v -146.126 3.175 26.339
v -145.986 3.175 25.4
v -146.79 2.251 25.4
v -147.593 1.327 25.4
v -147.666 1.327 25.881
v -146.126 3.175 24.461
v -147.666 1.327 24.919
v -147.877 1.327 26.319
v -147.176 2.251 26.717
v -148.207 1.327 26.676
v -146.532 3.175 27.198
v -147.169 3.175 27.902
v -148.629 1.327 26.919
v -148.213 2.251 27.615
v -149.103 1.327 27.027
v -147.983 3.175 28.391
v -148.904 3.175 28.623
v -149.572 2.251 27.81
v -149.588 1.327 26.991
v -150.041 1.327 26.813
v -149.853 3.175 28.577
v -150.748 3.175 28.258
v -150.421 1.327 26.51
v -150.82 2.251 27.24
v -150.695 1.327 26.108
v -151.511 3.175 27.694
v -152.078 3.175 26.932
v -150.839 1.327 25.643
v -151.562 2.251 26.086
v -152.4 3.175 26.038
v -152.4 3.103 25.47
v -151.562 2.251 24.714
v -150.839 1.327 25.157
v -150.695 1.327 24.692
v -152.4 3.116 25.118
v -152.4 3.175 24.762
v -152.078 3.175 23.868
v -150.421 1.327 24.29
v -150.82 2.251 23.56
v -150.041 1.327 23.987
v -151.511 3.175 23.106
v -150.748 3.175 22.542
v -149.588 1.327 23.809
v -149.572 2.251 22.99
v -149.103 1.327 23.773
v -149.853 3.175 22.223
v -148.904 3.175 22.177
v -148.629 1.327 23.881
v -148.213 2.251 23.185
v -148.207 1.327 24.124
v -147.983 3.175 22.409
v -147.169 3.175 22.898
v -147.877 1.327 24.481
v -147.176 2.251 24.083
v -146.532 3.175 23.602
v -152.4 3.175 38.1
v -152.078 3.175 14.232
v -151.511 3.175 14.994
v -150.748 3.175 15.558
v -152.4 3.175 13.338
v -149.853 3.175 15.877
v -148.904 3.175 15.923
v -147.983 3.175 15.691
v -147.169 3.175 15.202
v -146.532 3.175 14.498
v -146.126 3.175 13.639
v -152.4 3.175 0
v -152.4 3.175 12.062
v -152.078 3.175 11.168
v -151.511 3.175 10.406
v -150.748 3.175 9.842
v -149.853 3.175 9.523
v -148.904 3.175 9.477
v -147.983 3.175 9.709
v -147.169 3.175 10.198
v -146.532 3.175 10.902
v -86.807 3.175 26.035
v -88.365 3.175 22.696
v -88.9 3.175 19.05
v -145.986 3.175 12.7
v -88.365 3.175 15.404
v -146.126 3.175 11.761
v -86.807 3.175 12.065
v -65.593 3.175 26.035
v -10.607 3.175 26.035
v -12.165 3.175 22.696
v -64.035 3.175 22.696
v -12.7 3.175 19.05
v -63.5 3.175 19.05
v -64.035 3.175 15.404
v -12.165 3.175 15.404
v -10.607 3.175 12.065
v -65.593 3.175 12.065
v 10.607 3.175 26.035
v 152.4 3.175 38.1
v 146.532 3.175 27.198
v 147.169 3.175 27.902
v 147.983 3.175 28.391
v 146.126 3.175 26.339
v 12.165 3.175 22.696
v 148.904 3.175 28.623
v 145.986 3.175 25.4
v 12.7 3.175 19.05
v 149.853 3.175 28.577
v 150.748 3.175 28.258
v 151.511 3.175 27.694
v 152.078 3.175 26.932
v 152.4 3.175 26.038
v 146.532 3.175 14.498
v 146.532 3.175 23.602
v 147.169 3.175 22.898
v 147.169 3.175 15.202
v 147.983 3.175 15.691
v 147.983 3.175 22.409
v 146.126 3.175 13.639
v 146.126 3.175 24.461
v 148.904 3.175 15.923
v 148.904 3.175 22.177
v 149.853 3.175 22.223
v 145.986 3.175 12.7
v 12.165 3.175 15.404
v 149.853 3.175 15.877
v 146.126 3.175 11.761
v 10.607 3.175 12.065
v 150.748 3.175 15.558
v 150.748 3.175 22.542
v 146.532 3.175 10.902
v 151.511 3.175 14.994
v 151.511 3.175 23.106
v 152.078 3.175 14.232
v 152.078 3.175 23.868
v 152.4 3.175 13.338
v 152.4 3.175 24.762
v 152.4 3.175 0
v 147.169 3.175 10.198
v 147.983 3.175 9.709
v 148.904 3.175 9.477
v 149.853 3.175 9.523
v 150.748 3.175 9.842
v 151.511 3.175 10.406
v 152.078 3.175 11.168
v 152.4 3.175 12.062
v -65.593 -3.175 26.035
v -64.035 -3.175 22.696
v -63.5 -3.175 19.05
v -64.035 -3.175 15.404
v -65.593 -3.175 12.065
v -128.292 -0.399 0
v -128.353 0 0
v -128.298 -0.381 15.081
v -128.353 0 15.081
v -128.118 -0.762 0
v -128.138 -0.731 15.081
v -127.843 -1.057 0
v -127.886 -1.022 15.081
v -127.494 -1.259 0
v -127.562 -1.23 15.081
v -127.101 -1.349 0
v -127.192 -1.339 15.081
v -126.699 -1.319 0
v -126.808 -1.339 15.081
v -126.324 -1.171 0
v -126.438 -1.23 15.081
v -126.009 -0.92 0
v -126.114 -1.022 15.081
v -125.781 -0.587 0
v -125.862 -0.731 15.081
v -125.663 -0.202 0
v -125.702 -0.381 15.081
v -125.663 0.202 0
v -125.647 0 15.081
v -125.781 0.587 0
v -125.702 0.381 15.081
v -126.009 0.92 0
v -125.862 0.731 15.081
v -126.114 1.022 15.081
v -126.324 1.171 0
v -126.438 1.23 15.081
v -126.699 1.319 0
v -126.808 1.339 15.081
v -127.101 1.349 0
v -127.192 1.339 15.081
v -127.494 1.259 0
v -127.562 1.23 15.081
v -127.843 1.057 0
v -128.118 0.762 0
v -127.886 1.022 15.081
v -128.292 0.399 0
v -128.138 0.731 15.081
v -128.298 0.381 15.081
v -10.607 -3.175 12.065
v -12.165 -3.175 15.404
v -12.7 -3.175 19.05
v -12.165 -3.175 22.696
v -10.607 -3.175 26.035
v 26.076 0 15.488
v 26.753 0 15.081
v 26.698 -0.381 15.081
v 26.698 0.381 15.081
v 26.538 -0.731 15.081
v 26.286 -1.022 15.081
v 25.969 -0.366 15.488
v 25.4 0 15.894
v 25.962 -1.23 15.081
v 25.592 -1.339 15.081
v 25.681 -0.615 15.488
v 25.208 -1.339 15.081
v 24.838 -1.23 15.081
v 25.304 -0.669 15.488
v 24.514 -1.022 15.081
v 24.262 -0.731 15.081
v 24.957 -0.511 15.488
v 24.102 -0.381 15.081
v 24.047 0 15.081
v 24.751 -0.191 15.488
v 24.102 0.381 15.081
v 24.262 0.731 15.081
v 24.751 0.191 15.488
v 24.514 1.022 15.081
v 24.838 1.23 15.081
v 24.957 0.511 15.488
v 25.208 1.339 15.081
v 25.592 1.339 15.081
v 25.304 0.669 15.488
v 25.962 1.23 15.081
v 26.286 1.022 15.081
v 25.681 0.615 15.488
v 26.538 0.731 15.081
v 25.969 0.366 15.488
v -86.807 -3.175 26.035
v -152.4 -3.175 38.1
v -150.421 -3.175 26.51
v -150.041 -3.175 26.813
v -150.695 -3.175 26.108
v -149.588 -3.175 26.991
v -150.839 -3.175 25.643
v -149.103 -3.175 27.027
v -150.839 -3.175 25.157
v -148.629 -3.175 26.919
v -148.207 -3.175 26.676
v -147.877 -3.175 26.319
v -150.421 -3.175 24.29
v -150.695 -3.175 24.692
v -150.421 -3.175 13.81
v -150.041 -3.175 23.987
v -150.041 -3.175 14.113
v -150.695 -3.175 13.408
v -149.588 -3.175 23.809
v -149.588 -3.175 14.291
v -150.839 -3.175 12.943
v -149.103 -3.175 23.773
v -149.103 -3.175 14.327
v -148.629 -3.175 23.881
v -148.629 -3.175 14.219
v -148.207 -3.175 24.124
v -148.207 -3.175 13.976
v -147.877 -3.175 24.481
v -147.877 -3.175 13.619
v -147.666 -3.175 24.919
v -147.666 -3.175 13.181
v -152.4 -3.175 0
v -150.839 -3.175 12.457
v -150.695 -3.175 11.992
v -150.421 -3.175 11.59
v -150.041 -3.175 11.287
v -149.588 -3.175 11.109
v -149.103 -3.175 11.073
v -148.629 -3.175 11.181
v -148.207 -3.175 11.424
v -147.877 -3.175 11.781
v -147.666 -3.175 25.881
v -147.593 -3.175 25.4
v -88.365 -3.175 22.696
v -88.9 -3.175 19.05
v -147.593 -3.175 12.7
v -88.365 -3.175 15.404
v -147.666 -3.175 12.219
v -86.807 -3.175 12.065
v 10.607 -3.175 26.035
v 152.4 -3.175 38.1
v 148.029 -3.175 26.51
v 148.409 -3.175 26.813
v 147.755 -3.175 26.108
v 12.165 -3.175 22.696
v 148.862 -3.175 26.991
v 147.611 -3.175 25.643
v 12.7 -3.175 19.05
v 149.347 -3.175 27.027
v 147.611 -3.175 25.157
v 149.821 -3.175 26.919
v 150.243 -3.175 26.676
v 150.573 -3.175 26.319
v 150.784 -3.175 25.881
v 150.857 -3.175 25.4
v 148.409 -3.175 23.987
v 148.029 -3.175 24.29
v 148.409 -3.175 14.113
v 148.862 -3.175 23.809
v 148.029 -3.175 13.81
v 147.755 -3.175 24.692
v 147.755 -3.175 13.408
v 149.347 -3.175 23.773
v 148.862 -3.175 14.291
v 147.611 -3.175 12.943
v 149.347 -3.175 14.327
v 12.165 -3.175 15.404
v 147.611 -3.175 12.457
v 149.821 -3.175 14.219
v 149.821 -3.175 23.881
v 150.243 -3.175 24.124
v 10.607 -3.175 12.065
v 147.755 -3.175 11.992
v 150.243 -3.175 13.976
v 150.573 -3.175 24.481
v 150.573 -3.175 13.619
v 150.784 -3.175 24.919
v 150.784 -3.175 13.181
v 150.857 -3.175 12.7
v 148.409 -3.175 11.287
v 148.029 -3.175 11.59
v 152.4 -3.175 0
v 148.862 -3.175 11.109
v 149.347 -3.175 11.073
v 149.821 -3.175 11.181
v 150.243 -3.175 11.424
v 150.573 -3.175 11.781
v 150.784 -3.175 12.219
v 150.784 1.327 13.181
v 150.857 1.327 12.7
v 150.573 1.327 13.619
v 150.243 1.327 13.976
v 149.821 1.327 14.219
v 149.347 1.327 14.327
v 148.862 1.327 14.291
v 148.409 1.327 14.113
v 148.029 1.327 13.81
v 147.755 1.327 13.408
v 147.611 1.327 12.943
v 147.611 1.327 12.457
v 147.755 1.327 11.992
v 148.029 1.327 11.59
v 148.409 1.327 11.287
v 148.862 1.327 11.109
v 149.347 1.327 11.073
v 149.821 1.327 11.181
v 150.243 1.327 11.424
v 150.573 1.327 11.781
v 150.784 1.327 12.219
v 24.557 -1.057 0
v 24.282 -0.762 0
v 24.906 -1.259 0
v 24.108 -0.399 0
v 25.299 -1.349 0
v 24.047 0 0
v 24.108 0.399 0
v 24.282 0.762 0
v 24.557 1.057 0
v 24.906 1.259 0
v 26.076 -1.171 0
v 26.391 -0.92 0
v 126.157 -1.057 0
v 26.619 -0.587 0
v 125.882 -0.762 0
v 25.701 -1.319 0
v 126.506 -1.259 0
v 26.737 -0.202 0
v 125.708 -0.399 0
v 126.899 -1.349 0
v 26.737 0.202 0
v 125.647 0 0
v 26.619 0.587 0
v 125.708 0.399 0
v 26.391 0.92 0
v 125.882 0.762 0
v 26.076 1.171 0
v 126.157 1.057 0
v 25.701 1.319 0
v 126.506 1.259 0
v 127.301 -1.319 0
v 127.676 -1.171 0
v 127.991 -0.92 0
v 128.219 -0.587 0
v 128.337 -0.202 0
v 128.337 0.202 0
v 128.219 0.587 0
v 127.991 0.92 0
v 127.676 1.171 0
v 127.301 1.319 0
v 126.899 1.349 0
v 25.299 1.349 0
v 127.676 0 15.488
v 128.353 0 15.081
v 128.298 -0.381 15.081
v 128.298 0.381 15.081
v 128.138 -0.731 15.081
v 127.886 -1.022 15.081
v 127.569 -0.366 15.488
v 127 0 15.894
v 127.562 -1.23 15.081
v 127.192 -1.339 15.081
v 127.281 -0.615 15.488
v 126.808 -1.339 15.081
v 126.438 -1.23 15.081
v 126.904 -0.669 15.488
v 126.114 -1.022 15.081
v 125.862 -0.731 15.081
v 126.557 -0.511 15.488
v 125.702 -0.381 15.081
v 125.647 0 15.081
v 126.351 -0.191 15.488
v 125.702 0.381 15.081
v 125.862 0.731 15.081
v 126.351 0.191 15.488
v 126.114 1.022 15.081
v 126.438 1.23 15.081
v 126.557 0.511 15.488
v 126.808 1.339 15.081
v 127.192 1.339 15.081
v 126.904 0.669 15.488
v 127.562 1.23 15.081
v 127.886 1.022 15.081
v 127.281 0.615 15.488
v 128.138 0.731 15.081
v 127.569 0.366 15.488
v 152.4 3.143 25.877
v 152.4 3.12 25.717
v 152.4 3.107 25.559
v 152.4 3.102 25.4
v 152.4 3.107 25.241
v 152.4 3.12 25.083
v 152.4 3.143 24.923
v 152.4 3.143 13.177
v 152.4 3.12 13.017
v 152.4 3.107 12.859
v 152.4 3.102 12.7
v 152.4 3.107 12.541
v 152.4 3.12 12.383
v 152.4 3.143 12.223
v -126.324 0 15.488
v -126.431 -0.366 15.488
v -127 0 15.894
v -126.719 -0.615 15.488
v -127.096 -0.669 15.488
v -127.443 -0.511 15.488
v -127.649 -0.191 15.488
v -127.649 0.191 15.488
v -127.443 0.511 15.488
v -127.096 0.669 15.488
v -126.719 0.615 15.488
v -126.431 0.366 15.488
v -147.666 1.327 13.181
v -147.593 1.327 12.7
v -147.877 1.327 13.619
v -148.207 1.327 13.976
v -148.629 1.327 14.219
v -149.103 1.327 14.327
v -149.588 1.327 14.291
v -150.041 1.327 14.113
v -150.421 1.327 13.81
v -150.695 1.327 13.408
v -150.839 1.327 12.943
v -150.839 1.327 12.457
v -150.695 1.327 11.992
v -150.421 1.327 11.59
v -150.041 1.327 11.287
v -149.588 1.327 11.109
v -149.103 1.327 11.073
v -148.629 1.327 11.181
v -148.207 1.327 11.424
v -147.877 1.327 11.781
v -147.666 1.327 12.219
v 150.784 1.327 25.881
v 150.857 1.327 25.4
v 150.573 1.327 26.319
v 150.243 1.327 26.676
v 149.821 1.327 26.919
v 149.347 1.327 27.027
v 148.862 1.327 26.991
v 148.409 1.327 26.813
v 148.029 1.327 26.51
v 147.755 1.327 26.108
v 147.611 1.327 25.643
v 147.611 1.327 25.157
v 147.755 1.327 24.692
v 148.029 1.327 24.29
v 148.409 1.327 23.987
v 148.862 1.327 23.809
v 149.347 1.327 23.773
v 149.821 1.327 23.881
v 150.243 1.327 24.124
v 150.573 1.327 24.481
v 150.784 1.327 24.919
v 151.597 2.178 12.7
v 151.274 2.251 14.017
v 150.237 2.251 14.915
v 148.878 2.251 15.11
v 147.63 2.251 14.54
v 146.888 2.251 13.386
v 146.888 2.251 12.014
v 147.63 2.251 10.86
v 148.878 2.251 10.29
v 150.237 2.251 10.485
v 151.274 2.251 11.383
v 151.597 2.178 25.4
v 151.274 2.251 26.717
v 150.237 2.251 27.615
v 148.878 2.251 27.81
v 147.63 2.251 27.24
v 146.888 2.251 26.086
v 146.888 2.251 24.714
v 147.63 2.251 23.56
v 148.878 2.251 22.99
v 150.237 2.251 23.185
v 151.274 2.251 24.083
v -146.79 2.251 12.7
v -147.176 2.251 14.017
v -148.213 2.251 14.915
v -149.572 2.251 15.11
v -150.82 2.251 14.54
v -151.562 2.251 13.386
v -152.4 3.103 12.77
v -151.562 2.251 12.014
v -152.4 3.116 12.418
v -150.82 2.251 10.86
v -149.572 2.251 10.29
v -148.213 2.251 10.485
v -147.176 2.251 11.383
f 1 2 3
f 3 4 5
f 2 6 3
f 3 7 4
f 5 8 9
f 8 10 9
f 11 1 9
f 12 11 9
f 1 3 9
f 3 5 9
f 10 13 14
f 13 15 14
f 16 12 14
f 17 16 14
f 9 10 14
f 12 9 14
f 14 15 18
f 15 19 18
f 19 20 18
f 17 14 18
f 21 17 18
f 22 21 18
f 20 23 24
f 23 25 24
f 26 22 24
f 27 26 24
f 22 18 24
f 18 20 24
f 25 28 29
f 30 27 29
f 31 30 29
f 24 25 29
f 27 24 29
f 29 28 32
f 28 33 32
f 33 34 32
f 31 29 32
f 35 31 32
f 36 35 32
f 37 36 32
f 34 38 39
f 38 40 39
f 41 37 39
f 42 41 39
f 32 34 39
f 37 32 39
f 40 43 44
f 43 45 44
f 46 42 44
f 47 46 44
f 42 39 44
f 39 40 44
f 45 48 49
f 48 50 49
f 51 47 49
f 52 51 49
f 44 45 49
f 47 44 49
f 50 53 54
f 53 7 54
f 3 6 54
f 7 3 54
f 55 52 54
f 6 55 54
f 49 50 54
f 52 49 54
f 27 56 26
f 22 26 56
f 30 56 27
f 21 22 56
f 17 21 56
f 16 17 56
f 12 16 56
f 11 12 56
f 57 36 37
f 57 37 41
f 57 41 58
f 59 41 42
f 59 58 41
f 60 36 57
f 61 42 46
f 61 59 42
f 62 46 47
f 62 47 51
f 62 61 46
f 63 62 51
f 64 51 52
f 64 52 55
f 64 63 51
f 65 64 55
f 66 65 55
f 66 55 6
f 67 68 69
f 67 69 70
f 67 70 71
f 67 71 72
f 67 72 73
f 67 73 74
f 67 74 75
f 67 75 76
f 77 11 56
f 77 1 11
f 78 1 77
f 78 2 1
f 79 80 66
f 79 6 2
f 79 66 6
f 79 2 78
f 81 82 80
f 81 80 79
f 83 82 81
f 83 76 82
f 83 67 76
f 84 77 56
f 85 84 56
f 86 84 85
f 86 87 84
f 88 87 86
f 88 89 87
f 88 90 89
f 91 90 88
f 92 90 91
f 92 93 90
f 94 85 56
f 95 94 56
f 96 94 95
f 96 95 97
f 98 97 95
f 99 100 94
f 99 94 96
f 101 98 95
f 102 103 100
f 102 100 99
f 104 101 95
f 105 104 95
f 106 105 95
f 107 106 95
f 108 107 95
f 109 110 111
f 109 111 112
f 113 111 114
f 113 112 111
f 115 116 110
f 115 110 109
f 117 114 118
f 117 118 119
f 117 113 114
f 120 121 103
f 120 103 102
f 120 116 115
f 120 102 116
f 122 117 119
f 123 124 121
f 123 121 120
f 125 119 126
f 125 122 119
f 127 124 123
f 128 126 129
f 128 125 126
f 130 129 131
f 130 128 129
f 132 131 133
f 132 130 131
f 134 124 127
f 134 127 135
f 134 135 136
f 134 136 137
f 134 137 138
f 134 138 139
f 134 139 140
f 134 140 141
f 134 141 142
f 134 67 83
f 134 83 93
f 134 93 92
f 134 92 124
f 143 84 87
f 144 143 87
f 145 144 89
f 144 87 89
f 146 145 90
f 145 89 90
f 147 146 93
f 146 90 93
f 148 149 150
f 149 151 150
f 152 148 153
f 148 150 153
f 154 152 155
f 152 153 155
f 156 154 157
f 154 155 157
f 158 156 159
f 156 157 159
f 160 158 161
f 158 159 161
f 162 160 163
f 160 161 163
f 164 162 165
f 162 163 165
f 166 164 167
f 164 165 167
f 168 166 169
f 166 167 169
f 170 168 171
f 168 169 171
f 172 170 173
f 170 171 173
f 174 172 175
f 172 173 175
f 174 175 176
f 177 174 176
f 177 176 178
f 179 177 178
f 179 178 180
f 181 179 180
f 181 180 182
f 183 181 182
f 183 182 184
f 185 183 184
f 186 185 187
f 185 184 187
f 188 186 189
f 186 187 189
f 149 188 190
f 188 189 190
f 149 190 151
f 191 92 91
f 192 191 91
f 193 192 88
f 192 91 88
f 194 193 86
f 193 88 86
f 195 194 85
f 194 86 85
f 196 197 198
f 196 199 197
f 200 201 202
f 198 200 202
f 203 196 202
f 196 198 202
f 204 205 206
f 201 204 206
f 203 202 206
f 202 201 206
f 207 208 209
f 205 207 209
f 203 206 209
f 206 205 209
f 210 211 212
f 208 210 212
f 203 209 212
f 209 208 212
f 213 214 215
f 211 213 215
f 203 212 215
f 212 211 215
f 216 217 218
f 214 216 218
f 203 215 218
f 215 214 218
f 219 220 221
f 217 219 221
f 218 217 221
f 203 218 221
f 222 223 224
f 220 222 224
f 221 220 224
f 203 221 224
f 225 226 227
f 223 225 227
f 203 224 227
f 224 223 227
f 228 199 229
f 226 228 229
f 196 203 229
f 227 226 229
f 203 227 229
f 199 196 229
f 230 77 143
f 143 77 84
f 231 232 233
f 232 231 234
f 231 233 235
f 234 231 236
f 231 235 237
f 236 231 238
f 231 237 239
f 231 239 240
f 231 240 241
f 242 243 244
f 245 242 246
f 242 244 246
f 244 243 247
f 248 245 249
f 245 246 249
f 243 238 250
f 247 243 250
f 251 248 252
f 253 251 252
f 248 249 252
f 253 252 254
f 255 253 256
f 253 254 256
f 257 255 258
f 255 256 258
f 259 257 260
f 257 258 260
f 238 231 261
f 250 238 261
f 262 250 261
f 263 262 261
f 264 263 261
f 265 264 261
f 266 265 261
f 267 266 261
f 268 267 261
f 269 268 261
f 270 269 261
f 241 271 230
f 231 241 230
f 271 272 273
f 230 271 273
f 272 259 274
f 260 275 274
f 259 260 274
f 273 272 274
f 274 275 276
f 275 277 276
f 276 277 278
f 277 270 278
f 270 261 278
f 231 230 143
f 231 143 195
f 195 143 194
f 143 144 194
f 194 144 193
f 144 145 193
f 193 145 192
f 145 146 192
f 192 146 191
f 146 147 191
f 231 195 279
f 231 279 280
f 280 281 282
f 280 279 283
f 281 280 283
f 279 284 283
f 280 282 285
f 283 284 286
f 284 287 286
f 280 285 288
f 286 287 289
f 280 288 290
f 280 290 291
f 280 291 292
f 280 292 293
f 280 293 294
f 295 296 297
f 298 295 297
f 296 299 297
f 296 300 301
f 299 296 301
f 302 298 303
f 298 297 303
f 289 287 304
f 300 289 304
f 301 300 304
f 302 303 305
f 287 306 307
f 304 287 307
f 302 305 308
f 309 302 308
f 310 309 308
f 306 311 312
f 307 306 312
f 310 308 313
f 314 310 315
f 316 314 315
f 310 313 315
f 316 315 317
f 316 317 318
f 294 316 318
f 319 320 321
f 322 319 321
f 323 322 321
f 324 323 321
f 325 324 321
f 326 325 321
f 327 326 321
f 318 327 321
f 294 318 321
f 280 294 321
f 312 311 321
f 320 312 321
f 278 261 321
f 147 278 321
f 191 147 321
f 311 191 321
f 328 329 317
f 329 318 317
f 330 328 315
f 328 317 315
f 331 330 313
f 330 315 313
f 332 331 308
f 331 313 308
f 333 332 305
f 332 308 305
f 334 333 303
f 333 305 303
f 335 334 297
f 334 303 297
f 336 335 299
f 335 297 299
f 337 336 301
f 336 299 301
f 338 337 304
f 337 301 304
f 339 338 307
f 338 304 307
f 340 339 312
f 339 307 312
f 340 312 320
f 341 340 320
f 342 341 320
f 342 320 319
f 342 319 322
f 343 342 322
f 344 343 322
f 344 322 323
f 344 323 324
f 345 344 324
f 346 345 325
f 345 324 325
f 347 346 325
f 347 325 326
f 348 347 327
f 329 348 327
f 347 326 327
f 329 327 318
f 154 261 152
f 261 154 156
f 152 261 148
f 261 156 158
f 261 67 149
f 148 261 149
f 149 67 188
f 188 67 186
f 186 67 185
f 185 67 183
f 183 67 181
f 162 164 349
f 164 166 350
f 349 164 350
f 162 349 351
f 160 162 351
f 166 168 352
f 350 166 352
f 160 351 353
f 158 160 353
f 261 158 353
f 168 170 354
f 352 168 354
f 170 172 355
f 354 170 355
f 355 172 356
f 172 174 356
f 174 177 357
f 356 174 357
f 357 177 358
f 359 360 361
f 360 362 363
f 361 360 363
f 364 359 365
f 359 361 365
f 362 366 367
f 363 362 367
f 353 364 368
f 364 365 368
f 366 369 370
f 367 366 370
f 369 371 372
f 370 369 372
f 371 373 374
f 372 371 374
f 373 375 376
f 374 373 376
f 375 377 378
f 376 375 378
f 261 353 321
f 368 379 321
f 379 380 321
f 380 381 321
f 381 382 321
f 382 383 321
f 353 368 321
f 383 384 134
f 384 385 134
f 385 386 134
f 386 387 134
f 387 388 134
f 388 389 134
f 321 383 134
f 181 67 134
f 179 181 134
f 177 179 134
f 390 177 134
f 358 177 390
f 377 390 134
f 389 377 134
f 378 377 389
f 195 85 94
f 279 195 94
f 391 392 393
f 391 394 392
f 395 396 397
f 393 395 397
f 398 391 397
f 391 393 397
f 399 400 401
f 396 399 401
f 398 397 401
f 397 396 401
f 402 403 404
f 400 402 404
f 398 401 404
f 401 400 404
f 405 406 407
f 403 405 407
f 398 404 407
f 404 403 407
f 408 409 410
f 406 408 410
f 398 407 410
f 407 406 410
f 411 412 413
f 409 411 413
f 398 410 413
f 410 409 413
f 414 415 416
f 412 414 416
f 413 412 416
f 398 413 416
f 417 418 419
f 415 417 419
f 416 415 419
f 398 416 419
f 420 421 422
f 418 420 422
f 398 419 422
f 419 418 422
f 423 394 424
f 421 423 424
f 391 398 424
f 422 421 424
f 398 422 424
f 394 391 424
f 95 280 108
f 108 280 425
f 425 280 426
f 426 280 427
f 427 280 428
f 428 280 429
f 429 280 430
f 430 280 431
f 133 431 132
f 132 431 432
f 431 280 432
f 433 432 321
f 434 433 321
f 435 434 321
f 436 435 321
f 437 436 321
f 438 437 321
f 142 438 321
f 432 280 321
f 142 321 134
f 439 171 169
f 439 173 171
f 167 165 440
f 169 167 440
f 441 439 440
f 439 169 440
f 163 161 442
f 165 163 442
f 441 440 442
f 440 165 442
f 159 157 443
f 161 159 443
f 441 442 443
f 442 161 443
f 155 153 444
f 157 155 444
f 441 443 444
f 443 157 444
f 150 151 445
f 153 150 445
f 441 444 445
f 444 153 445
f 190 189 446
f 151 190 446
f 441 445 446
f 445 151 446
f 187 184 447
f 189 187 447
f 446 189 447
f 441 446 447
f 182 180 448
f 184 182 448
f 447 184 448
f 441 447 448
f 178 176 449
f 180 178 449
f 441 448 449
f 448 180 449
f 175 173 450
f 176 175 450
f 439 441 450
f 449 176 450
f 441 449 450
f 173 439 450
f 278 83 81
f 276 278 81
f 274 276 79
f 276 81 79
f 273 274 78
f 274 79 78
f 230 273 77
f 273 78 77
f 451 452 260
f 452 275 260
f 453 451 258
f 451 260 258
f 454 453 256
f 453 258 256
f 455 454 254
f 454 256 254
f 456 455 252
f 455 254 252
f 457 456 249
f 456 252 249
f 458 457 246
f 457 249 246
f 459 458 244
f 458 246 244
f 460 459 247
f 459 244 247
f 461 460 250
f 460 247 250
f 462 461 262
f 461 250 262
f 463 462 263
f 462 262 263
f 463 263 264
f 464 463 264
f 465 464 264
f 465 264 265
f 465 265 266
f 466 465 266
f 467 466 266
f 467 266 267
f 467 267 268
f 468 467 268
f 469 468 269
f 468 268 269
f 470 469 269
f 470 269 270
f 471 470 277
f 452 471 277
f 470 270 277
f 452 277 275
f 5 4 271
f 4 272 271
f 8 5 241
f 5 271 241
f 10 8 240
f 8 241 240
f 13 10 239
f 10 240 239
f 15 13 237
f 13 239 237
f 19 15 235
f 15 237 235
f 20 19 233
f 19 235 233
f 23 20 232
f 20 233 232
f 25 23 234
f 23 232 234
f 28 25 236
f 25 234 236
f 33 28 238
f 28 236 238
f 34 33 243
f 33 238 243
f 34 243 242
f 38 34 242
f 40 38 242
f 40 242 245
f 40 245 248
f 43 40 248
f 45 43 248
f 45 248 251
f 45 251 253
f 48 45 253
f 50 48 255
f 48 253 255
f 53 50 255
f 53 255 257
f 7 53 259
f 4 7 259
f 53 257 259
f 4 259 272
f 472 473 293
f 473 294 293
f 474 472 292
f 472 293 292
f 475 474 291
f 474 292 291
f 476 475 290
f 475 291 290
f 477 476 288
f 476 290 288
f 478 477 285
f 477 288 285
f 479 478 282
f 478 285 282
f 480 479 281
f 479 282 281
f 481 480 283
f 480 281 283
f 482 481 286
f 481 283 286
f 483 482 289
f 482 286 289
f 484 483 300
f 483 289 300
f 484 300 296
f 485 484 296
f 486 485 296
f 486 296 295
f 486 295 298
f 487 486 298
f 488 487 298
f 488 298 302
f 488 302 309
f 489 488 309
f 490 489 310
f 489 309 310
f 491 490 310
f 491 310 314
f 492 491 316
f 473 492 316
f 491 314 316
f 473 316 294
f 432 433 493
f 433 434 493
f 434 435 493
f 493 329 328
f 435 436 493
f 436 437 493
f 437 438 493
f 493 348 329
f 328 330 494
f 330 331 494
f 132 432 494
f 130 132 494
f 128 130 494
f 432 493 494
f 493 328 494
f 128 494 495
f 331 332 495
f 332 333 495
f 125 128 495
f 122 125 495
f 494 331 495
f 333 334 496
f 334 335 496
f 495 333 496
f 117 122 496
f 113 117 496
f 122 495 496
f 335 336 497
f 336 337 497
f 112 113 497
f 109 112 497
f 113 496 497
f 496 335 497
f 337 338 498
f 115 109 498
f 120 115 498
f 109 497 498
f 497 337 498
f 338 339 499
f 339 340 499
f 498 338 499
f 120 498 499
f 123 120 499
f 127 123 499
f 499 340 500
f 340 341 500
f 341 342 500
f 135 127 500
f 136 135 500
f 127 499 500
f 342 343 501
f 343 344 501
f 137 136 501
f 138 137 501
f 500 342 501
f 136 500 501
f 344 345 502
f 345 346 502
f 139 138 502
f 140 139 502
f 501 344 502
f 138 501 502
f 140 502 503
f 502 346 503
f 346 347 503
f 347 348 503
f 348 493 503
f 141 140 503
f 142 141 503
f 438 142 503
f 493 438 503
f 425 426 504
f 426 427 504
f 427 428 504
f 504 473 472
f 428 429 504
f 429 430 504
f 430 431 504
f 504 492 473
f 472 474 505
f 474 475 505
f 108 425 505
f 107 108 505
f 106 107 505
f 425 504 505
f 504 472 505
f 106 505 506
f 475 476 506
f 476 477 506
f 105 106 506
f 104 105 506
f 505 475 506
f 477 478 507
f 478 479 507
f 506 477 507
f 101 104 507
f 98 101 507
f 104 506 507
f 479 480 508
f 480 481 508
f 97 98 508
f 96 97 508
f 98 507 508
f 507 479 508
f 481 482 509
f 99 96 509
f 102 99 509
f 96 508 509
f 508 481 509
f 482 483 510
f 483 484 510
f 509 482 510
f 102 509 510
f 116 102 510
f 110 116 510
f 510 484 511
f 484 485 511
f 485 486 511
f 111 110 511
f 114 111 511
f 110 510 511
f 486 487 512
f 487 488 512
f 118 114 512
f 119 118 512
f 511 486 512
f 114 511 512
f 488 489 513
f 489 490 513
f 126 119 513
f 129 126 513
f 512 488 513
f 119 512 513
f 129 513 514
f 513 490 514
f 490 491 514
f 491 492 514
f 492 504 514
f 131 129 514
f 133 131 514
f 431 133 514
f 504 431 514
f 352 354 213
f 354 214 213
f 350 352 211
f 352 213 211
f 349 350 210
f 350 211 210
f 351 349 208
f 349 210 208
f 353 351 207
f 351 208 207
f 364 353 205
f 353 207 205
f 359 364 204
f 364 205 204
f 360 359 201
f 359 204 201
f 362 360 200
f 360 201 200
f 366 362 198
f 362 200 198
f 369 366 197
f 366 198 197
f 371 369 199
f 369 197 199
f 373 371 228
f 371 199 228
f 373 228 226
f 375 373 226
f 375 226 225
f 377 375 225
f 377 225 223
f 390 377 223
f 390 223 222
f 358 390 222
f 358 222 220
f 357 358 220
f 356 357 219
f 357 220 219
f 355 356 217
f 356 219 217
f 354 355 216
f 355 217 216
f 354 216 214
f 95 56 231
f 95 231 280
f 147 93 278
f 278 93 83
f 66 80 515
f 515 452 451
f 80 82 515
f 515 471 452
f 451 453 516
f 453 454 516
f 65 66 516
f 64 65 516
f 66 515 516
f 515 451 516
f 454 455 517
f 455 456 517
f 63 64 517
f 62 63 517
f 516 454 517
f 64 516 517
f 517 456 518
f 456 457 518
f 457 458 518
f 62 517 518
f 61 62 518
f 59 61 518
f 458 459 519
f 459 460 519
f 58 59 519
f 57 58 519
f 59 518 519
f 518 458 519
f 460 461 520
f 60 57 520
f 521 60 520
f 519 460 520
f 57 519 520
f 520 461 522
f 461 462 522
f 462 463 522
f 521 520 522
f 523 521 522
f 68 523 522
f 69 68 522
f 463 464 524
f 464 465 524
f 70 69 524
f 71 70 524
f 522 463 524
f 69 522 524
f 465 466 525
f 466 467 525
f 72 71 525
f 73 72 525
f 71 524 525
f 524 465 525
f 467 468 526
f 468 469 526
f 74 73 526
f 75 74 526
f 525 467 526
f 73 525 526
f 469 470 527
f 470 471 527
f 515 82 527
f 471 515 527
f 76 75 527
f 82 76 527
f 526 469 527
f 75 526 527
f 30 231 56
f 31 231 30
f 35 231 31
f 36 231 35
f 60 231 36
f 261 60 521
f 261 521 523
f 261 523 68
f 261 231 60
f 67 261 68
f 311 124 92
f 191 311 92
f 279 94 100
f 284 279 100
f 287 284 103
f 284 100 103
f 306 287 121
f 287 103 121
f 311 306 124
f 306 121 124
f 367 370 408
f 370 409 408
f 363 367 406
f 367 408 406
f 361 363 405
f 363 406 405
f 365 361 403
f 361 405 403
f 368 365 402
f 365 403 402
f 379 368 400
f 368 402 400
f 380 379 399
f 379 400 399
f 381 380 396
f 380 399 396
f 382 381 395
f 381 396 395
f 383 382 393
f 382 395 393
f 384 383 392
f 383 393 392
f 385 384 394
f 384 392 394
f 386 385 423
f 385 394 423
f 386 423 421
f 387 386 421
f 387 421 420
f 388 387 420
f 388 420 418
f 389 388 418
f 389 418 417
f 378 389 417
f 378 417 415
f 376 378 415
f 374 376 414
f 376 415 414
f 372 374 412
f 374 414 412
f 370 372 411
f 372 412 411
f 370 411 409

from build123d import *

# Parameters (mm, degrees)
F0_W           = 304.8
F0_H           = 6.35
F1_DEPTH       = 38.1
F3_D           = 2.7051
F3_DEPTH       = 15.08125
F3_TIP         = 0.8126940303
F5_D           = 3.2639
F5_CSINK_D     = 6.477
F5_CSINK_ANGLE = 82
F7_DEPTH       = 25.4


with BuildPart() as f1:
    # F0 (on Top) → F1 (new body)
    with BuildSketch(Plane.XY):
        Rectangle(F0_W, F0_H)
    extrude(amount=F1_DEPTH)

    # F3
    with Locations(Plane(origin=(0, 0, 0), x_dir=(1, 0, 0), z_dir=(0, 0, -1))):
        with Locations((-127, 0), (127, 0), (25.4, 0)):
            Hole(F3_D / 2, depth=F3_DEPTH)
            with Locations((0, 0, -(F3_DEPTH + F3_TIP / 2))):  # 118° drill point
                Cone(0, F3_D / 2, F3_TIP, mode=Mode.SUBTRACT)

    # F5 (through all)
    with Locations(Plane(origin=(0, 3.175, 0), x_dir=(-1, 0, 0), z_dir=(0, 1, 0))):
        with Locations((-149.225, 25.4), (-149.225, 12.7), (149.225, 25.4), (149.225, 12.7)):
            CounterSinkHole(F5_D / 2, F5_CSINK_D / 2, counter_sink_angle=F5_CSINK_ANGLE)

    # F6 (on face) → F7 (cut)
    with BuildSketch(Plane(origin=(0, 3.175, 0), x_dir=(-1, 0, 0), z_dir=(0, 1, 0))):
        with BuildLine():
            Line((10.6065911112, 26.035), (-10.6065911112, 26.035))
            ThreePointArc((-10.6065911112, 26.035), (-12.7, 19.05), (-10.6065911112, 12.065))
            Line((-10.6065911112, 12.065), (10.6065911112, 12.065))
            ThreePointArc((10.6065911112, 12.065), (12.7, 19.05), (10.6065911112, 26.035))
        make_face()
        with BuildLine():
            Line((65.5934088888, 12.065), (86.8065911112, 12.065))
            ThreePointArc((86.8065911112, 12.065), (88.9, 19.05), (86.8065911112, 26.035))
            Line((86.8065911112, 26.035), (65.5934088888, 26.035))
            ThreePointArc((65.5934088888, 26.035), (63.5, 19.05), (65.5934088888, 12.065))
        make_face()
    extrude(amount=-F7_DEPTH, mode=Mode.SUBTRACT)


solid = f1.part
